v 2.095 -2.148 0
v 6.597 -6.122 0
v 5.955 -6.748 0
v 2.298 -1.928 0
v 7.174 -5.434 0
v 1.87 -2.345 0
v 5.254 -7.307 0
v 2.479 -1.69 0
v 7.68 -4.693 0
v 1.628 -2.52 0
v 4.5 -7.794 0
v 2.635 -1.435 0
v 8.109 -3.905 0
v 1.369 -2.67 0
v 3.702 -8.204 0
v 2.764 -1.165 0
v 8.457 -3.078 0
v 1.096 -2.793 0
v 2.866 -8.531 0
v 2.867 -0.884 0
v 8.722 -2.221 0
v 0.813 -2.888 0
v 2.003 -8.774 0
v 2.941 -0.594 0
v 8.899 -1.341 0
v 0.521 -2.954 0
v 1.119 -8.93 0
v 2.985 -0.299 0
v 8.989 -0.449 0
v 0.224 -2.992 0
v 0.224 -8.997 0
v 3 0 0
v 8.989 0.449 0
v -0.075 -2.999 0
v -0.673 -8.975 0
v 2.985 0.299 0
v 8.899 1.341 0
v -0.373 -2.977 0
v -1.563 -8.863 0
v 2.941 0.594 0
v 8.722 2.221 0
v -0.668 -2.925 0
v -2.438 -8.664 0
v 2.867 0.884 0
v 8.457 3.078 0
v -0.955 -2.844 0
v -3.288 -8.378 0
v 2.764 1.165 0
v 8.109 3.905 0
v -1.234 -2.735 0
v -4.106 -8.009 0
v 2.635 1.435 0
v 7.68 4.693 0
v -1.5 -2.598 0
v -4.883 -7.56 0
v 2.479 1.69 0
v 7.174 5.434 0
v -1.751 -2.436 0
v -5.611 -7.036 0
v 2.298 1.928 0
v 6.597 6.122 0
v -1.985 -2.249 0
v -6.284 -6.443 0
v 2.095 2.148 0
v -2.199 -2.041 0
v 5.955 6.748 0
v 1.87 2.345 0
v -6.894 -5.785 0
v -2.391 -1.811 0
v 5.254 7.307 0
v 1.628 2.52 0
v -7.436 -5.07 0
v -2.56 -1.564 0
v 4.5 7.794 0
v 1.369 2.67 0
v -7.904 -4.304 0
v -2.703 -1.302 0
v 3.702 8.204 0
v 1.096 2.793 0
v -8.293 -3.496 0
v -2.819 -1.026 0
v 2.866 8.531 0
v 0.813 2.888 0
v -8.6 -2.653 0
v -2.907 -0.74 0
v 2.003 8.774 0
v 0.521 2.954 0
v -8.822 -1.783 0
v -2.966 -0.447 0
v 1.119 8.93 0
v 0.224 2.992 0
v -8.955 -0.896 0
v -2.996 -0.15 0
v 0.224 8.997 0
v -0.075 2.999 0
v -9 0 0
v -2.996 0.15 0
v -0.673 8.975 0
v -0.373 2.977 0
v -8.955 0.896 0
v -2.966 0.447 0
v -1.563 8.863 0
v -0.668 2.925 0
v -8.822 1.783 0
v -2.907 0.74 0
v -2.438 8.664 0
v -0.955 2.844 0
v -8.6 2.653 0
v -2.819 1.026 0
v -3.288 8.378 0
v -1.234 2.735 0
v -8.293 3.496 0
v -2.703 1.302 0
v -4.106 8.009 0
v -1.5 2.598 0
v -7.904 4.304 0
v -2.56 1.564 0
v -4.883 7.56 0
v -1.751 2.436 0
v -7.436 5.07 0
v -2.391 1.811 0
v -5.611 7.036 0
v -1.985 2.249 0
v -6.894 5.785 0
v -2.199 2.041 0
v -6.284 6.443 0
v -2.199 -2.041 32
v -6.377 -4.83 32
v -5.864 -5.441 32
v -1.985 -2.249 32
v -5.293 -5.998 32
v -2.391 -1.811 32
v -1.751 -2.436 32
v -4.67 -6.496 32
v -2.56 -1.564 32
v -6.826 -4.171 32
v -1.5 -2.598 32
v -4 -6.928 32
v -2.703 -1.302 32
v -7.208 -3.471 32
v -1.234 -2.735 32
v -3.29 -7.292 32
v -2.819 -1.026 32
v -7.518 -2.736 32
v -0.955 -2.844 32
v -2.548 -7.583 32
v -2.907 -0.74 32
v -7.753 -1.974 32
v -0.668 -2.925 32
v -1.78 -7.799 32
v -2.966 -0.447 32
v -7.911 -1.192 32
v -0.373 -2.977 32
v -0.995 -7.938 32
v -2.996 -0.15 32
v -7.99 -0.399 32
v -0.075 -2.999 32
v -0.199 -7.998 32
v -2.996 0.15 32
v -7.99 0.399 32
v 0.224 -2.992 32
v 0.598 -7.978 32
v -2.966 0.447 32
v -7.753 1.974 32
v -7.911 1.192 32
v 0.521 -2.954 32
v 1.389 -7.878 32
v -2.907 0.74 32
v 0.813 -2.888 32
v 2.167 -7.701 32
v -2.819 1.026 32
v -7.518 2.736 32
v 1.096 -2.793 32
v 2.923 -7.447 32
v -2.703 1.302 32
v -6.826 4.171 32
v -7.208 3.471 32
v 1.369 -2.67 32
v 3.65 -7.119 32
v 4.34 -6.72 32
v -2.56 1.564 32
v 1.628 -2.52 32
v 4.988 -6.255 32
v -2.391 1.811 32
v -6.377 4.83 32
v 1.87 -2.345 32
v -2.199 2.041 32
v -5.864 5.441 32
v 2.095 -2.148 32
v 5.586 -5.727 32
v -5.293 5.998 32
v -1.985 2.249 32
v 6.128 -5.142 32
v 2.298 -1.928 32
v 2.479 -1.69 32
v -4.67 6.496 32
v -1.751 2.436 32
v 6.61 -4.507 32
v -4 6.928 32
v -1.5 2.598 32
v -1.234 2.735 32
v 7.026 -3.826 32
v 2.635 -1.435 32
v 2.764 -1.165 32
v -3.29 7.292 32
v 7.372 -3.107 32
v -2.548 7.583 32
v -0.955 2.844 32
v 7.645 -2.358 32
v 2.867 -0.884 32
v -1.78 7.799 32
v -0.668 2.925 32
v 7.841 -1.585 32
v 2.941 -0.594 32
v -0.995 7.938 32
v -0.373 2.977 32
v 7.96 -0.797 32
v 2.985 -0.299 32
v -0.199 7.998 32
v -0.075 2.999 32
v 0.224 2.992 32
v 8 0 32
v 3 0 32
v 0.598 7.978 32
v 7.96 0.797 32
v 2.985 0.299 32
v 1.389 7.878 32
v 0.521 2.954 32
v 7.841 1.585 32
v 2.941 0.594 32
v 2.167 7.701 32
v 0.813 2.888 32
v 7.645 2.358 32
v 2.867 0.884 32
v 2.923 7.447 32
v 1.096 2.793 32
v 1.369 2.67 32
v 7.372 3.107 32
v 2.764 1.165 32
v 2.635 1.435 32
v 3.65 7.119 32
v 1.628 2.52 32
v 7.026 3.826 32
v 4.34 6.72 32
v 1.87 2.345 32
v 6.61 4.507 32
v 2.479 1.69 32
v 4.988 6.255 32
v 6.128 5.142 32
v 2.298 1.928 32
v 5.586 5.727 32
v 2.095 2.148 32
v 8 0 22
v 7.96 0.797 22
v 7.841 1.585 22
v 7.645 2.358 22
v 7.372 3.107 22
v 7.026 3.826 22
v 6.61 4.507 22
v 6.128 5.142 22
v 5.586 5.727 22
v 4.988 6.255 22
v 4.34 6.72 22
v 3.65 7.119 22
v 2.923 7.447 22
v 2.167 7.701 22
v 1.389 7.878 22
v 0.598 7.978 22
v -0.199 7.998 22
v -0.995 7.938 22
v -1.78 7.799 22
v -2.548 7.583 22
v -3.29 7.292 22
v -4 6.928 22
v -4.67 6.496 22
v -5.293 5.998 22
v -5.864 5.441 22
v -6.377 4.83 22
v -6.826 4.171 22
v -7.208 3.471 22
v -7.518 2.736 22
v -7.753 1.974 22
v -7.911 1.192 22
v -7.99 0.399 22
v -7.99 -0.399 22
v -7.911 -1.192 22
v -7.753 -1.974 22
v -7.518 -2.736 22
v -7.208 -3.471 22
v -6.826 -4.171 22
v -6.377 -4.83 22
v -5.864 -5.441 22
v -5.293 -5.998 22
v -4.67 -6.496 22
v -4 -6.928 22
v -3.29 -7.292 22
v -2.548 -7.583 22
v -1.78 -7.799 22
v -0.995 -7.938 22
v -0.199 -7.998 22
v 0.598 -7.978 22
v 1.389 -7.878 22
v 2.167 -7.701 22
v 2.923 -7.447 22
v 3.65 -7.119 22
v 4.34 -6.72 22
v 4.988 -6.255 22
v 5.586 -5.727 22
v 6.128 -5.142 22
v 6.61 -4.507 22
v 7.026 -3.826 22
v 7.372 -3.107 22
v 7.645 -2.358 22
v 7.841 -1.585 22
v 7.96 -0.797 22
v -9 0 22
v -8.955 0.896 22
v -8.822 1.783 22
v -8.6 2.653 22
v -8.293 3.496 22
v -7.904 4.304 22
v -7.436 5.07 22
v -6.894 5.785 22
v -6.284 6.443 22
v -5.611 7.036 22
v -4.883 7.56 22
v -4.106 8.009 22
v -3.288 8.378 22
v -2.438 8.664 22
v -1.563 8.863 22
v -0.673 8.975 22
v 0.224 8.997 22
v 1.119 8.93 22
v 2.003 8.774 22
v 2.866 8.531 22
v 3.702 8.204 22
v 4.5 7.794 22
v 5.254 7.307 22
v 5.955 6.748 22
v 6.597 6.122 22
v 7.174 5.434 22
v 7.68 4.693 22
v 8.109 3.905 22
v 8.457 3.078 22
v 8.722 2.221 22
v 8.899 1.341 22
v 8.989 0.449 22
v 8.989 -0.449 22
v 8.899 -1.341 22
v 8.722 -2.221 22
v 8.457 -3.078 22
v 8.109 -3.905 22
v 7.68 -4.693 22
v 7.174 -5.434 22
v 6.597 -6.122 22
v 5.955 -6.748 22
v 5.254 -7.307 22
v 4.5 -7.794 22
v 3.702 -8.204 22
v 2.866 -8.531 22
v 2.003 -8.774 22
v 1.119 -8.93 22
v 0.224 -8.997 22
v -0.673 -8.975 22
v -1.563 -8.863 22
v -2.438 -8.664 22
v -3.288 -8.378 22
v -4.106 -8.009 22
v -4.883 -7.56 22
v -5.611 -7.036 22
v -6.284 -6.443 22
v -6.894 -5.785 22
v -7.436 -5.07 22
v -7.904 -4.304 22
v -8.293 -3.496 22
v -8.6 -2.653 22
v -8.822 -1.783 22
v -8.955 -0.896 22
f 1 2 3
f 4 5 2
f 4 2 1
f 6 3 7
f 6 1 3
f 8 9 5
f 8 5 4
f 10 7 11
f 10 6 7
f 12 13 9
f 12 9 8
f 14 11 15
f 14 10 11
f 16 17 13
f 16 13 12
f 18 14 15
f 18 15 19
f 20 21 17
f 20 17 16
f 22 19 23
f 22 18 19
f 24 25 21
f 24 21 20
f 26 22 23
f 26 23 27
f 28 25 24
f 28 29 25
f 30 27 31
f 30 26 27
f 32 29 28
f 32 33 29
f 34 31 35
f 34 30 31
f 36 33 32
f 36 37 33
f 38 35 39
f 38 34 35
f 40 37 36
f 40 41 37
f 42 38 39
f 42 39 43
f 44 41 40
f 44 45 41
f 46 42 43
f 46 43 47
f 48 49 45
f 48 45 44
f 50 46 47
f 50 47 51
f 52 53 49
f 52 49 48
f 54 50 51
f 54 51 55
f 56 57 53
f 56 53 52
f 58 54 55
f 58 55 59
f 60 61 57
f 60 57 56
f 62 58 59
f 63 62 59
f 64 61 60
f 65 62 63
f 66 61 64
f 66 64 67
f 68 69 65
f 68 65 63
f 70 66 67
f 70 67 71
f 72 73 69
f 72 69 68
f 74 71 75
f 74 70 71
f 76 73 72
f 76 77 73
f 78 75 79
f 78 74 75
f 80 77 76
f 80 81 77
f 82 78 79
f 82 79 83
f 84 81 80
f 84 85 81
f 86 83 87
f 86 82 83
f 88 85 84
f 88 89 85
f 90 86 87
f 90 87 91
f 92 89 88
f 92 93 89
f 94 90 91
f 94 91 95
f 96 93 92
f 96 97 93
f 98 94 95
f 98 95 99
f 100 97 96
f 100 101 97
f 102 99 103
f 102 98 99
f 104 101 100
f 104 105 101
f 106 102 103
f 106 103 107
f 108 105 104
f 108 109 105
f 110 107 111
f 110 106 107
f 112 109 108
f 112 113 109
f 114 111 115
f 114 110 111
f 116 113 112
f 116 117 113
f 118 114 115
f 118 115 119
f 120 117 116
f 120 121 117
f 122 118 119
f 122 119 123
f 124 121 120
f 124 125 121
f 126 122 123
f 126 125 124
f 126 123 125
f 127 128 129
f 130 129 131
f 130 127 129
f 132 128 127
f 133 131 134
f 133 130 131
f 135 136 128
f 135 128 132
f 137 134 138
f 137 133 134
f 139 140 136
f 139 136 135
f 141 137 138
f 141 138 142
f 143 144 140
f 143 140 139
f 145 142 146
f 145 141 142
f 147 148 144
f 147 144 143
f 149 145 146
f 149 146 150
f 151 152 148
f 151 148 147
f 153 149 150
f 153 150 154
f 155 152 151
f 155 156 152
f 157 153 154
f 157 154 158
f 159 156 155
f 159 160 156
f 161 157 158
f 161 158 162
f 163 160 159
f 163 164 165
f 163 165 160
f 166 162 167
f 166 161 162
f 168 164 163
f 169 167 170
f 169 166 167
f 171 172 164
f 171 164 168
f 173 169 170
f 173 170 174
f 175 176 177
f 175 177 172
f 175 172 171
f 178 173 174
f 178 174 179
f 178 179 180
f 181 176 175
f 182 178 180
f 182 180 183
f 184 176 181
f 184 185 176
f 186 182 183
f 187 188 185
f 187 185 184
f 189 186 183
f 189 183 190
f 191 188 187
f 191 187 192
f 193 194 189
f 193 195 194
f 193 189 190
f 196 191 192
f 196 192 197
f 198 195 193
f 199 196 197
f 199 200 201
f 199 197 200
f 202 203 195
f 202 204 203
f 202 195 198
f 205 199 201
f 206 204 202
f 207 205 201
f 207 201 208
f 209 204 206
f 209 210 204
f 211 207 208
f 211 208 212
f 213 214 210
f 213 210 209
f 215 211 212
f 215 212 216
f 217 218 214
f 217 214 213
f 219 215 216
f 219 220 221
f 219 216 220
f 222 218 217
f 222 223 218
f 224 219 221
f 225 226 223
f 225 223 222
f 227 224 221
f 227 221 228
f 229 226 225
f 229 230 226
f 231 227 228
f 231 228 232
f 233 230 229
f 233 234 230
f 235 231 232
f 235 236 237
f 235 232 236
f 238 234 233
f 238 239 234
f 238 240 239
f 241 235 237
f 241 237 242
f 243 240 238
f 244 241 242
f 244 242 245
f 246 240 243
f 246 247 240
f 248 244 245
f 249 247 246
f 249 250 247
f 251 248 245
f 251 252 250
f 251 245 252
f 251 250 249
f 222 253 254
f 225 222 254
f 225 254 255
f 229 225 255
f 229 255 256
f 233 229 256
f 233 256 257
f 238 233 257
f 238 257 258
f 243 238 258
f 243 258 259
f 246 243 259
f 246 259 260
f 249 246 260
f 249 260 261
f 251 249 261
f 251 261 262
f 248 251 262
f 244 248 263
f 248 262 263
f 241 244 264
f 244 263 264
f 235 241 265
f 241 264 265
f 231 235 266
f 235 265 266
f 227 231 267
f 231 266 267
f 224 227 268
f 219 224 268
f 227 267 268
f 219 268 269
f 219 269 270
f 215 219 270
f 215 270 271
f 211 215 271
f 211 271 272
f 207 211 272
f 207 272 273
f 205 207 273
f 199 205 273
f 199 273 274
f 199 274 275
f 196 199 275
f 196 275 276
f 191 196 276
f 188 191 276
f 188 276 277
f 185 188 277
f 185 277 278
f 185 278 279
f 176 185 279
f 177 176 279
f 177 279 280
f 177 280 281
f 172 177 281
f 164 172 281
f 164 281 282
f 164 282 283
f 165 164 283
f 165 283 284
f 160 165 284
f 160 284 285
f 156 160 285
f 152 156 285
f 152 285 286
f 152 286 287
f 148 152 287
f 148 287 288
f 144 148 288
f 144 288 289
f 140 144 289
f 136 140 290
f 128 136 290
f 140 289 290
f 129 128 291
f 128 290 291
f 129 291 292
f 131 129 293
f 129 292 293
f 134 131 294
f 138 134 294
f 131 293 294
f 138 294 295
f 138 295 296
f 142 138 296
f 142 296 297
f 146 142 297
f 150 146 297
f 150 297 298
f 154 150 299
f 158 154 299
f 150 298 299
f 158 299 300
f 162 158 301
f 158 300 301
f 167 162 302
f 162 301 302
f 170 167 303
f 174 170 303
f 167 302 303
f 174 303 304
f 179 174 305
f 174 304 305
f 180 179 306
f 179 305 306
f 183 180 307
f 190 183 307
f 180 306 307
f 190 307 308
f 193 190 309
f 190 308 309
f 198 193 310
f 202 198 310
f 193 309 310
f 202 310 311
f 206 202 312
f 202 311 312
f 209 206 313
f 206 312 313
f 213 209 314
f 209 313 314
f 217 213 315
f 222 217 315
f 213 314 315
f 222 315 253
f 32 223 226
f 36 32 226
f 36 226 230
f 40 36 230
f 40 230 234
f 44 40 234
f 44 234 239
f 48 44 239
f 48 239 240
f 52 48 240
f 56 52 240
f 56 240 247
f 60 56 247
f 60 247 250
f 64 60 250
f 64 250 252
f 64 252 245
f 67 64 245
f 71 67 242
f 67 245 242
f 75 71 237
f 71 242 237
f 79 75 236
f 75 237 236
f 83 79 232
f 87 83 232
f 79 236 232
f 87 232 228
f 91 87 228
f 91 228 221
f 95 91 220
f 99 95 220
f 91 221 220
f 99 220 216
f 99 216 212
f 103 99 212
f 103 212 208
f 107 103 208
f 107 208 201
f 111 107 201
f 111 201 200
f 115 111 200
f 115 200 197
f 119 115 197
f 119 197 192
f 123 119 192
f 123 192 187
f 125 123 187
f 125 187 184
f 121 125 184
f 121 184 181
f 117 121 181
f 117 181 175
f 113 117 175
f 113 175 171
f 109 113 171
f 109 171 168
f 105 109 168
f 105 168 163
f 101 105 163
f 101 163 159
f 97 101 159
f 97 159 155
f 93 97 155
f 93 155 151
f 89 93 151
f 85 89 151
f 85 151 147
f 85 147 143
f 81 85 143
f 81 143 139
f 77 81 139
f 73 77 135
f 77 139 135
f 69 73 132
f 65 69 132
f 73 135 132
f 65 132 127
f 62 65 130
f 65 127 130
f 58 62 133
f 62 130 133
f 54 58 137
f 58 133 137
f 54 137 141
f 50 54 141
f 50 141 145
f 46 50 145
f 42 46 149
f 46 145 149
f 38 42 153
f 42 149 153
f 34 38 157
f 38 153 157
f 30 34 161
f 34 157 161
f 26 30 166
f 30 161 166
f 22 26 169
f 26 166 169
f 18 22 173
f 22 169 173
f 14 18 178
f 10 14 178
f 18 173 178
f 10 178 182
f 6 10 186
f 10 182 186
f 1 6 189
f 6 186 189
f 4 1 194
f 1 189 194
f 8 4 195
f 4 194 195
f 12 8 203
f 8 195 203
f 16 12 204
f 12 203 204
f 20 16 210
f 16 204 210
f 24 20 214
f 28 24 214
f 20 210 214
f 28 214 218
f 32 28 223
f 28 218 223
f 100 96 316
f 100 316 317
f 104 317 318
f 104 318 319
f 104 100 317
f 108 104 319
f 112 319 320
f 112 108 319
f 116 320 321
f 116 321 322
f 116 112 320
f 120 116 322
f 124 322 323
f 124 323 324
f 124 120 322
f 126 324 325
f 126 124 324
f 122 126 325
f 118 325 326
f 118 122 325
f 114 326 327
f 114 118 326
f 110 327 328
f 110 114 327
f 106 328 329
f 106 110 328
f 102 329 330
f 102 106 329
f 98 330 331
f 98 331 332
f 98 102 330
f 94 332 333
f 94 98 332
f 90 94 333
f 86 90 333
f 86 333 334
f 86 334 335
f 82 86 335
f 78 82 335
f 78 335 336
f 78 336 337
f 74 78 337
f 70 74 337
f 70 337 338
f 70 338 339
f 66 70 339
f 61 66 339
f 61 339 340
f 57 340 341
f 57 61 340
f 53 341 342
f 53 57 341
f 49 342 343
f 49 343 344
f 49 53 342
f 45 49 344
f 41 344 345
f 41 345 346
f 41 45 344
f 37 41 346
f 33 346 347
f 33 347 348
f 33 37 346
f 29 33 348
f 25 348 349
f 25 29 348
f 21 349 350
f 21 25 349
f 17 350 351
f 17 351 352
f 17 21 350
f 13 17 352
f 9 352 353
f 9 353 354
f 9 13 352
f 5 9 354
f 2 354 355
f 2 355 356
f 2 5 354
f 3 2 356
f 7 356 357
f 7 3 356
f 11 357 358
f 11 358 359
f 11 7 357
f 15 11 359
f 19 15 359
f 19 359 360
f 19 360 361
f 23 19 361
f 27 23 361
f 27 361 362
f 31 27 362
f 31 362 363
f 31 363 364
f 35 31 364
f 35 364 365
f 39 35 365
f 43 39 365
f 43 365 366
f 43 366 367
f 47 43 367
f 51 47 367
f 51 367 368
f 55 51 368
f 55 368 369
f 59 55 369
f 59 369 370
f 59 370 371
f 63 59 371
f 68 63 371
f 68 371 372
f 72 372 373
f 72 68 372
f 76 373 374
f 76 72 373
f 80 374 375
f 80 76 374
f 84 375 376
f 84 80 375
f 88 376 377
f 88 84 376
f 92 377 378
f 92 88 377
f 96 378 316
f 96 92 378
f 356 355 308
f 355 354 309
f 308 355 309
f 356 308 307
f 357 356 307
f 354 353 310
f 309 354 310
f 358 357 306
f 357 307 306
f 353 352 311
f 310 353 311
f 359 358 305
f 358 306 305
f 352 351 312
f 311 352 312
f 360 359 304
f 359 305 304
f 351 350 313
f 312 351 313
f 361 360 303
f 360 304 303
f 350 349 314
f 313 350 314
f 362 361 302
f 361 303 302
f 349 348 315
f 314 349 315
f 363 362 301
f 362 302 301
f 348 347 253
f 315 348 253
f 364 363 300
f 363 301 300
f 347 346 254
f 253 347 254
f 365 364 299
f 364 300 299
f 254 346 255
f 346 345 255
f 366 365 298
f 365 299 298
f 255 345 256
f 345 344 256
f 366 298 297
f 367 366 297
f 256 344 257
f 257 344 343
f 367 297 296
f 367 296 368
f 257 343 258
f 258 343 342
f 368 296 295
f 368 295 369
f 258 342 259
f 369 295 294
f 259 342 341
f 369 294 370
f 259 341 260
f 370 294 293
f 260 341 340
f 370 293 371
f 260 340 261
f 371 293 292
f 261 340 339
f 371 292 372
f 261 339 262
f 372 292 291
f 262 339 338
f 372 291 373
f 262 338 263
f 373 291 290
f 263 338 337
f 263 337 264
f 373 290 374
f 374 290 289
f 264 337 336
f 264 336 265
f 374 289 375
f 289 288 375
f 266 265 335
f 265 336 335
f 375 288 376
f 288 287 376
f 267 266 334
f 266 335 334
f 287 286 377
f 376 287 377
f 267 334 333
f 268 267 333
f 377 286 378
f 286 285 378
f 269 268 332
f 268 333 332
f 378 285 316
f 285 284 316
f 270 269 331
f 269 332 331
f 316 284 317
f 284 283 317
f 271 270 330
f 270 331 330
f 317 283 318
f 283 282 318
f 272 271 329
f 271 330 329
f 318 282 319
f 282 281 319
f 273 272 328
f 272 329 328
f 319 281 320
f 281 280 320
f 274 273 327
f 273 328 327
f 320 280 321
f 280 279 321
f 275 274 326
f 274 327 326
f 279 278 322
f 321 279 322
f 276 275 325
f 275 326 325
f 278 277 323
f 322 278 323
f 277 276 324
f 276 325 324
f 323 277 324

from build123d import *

# Parameters (mm, degrees)
SKETCH_1_R          = 8
EXTRUDE_1_DEPTH     = 32
SKETCH_2_R          = 9
EXTRUDE_2_DEPTH     = 22
CUT_EXTRUDE_1_REACH = 36.438
SKETCH_3_R          = 3


with BuildPart() as part:
    # 草图1 → 凸台-拉伸1 (new body)
    with BuildSketch(Plane.XY):
        Circle(SKETCH_1_R)
    extrude(amount=EXTRUDE_1_DEPTH)

    # 草图2 → 凸台-拉伸2 (add)
    with BuildSketch(Plane(origin=(0, 0, 0), x_dir=(-1, 0, 0), z_dir=(0, 0, -1))):
        Circle(SKETCH_2_R)
    extrude(amount=-EXTRUDE_2_DEPTH)

    # 草图3 → 切除-拉伸1 (cut, up to next)
    with BuildSketch(Plane.XY.offset(32), mode=Mode.PRIVATE) as cut_extrude_1_sk1:
        Circle(SKETCH_3_R)
    cut_extrude_1_tool1 = extrude(cut_extrude_1_sk1.sketch, amount=-CUT_EXTRUDE_1_REACH, mode=Mode.PRIVATE) & part.part
    add(cut_extrude_1_tool1.solids().sort_by_distance((0, 0, 32))[0], mode=Mode.SUBTRACT)


solid = part.part
